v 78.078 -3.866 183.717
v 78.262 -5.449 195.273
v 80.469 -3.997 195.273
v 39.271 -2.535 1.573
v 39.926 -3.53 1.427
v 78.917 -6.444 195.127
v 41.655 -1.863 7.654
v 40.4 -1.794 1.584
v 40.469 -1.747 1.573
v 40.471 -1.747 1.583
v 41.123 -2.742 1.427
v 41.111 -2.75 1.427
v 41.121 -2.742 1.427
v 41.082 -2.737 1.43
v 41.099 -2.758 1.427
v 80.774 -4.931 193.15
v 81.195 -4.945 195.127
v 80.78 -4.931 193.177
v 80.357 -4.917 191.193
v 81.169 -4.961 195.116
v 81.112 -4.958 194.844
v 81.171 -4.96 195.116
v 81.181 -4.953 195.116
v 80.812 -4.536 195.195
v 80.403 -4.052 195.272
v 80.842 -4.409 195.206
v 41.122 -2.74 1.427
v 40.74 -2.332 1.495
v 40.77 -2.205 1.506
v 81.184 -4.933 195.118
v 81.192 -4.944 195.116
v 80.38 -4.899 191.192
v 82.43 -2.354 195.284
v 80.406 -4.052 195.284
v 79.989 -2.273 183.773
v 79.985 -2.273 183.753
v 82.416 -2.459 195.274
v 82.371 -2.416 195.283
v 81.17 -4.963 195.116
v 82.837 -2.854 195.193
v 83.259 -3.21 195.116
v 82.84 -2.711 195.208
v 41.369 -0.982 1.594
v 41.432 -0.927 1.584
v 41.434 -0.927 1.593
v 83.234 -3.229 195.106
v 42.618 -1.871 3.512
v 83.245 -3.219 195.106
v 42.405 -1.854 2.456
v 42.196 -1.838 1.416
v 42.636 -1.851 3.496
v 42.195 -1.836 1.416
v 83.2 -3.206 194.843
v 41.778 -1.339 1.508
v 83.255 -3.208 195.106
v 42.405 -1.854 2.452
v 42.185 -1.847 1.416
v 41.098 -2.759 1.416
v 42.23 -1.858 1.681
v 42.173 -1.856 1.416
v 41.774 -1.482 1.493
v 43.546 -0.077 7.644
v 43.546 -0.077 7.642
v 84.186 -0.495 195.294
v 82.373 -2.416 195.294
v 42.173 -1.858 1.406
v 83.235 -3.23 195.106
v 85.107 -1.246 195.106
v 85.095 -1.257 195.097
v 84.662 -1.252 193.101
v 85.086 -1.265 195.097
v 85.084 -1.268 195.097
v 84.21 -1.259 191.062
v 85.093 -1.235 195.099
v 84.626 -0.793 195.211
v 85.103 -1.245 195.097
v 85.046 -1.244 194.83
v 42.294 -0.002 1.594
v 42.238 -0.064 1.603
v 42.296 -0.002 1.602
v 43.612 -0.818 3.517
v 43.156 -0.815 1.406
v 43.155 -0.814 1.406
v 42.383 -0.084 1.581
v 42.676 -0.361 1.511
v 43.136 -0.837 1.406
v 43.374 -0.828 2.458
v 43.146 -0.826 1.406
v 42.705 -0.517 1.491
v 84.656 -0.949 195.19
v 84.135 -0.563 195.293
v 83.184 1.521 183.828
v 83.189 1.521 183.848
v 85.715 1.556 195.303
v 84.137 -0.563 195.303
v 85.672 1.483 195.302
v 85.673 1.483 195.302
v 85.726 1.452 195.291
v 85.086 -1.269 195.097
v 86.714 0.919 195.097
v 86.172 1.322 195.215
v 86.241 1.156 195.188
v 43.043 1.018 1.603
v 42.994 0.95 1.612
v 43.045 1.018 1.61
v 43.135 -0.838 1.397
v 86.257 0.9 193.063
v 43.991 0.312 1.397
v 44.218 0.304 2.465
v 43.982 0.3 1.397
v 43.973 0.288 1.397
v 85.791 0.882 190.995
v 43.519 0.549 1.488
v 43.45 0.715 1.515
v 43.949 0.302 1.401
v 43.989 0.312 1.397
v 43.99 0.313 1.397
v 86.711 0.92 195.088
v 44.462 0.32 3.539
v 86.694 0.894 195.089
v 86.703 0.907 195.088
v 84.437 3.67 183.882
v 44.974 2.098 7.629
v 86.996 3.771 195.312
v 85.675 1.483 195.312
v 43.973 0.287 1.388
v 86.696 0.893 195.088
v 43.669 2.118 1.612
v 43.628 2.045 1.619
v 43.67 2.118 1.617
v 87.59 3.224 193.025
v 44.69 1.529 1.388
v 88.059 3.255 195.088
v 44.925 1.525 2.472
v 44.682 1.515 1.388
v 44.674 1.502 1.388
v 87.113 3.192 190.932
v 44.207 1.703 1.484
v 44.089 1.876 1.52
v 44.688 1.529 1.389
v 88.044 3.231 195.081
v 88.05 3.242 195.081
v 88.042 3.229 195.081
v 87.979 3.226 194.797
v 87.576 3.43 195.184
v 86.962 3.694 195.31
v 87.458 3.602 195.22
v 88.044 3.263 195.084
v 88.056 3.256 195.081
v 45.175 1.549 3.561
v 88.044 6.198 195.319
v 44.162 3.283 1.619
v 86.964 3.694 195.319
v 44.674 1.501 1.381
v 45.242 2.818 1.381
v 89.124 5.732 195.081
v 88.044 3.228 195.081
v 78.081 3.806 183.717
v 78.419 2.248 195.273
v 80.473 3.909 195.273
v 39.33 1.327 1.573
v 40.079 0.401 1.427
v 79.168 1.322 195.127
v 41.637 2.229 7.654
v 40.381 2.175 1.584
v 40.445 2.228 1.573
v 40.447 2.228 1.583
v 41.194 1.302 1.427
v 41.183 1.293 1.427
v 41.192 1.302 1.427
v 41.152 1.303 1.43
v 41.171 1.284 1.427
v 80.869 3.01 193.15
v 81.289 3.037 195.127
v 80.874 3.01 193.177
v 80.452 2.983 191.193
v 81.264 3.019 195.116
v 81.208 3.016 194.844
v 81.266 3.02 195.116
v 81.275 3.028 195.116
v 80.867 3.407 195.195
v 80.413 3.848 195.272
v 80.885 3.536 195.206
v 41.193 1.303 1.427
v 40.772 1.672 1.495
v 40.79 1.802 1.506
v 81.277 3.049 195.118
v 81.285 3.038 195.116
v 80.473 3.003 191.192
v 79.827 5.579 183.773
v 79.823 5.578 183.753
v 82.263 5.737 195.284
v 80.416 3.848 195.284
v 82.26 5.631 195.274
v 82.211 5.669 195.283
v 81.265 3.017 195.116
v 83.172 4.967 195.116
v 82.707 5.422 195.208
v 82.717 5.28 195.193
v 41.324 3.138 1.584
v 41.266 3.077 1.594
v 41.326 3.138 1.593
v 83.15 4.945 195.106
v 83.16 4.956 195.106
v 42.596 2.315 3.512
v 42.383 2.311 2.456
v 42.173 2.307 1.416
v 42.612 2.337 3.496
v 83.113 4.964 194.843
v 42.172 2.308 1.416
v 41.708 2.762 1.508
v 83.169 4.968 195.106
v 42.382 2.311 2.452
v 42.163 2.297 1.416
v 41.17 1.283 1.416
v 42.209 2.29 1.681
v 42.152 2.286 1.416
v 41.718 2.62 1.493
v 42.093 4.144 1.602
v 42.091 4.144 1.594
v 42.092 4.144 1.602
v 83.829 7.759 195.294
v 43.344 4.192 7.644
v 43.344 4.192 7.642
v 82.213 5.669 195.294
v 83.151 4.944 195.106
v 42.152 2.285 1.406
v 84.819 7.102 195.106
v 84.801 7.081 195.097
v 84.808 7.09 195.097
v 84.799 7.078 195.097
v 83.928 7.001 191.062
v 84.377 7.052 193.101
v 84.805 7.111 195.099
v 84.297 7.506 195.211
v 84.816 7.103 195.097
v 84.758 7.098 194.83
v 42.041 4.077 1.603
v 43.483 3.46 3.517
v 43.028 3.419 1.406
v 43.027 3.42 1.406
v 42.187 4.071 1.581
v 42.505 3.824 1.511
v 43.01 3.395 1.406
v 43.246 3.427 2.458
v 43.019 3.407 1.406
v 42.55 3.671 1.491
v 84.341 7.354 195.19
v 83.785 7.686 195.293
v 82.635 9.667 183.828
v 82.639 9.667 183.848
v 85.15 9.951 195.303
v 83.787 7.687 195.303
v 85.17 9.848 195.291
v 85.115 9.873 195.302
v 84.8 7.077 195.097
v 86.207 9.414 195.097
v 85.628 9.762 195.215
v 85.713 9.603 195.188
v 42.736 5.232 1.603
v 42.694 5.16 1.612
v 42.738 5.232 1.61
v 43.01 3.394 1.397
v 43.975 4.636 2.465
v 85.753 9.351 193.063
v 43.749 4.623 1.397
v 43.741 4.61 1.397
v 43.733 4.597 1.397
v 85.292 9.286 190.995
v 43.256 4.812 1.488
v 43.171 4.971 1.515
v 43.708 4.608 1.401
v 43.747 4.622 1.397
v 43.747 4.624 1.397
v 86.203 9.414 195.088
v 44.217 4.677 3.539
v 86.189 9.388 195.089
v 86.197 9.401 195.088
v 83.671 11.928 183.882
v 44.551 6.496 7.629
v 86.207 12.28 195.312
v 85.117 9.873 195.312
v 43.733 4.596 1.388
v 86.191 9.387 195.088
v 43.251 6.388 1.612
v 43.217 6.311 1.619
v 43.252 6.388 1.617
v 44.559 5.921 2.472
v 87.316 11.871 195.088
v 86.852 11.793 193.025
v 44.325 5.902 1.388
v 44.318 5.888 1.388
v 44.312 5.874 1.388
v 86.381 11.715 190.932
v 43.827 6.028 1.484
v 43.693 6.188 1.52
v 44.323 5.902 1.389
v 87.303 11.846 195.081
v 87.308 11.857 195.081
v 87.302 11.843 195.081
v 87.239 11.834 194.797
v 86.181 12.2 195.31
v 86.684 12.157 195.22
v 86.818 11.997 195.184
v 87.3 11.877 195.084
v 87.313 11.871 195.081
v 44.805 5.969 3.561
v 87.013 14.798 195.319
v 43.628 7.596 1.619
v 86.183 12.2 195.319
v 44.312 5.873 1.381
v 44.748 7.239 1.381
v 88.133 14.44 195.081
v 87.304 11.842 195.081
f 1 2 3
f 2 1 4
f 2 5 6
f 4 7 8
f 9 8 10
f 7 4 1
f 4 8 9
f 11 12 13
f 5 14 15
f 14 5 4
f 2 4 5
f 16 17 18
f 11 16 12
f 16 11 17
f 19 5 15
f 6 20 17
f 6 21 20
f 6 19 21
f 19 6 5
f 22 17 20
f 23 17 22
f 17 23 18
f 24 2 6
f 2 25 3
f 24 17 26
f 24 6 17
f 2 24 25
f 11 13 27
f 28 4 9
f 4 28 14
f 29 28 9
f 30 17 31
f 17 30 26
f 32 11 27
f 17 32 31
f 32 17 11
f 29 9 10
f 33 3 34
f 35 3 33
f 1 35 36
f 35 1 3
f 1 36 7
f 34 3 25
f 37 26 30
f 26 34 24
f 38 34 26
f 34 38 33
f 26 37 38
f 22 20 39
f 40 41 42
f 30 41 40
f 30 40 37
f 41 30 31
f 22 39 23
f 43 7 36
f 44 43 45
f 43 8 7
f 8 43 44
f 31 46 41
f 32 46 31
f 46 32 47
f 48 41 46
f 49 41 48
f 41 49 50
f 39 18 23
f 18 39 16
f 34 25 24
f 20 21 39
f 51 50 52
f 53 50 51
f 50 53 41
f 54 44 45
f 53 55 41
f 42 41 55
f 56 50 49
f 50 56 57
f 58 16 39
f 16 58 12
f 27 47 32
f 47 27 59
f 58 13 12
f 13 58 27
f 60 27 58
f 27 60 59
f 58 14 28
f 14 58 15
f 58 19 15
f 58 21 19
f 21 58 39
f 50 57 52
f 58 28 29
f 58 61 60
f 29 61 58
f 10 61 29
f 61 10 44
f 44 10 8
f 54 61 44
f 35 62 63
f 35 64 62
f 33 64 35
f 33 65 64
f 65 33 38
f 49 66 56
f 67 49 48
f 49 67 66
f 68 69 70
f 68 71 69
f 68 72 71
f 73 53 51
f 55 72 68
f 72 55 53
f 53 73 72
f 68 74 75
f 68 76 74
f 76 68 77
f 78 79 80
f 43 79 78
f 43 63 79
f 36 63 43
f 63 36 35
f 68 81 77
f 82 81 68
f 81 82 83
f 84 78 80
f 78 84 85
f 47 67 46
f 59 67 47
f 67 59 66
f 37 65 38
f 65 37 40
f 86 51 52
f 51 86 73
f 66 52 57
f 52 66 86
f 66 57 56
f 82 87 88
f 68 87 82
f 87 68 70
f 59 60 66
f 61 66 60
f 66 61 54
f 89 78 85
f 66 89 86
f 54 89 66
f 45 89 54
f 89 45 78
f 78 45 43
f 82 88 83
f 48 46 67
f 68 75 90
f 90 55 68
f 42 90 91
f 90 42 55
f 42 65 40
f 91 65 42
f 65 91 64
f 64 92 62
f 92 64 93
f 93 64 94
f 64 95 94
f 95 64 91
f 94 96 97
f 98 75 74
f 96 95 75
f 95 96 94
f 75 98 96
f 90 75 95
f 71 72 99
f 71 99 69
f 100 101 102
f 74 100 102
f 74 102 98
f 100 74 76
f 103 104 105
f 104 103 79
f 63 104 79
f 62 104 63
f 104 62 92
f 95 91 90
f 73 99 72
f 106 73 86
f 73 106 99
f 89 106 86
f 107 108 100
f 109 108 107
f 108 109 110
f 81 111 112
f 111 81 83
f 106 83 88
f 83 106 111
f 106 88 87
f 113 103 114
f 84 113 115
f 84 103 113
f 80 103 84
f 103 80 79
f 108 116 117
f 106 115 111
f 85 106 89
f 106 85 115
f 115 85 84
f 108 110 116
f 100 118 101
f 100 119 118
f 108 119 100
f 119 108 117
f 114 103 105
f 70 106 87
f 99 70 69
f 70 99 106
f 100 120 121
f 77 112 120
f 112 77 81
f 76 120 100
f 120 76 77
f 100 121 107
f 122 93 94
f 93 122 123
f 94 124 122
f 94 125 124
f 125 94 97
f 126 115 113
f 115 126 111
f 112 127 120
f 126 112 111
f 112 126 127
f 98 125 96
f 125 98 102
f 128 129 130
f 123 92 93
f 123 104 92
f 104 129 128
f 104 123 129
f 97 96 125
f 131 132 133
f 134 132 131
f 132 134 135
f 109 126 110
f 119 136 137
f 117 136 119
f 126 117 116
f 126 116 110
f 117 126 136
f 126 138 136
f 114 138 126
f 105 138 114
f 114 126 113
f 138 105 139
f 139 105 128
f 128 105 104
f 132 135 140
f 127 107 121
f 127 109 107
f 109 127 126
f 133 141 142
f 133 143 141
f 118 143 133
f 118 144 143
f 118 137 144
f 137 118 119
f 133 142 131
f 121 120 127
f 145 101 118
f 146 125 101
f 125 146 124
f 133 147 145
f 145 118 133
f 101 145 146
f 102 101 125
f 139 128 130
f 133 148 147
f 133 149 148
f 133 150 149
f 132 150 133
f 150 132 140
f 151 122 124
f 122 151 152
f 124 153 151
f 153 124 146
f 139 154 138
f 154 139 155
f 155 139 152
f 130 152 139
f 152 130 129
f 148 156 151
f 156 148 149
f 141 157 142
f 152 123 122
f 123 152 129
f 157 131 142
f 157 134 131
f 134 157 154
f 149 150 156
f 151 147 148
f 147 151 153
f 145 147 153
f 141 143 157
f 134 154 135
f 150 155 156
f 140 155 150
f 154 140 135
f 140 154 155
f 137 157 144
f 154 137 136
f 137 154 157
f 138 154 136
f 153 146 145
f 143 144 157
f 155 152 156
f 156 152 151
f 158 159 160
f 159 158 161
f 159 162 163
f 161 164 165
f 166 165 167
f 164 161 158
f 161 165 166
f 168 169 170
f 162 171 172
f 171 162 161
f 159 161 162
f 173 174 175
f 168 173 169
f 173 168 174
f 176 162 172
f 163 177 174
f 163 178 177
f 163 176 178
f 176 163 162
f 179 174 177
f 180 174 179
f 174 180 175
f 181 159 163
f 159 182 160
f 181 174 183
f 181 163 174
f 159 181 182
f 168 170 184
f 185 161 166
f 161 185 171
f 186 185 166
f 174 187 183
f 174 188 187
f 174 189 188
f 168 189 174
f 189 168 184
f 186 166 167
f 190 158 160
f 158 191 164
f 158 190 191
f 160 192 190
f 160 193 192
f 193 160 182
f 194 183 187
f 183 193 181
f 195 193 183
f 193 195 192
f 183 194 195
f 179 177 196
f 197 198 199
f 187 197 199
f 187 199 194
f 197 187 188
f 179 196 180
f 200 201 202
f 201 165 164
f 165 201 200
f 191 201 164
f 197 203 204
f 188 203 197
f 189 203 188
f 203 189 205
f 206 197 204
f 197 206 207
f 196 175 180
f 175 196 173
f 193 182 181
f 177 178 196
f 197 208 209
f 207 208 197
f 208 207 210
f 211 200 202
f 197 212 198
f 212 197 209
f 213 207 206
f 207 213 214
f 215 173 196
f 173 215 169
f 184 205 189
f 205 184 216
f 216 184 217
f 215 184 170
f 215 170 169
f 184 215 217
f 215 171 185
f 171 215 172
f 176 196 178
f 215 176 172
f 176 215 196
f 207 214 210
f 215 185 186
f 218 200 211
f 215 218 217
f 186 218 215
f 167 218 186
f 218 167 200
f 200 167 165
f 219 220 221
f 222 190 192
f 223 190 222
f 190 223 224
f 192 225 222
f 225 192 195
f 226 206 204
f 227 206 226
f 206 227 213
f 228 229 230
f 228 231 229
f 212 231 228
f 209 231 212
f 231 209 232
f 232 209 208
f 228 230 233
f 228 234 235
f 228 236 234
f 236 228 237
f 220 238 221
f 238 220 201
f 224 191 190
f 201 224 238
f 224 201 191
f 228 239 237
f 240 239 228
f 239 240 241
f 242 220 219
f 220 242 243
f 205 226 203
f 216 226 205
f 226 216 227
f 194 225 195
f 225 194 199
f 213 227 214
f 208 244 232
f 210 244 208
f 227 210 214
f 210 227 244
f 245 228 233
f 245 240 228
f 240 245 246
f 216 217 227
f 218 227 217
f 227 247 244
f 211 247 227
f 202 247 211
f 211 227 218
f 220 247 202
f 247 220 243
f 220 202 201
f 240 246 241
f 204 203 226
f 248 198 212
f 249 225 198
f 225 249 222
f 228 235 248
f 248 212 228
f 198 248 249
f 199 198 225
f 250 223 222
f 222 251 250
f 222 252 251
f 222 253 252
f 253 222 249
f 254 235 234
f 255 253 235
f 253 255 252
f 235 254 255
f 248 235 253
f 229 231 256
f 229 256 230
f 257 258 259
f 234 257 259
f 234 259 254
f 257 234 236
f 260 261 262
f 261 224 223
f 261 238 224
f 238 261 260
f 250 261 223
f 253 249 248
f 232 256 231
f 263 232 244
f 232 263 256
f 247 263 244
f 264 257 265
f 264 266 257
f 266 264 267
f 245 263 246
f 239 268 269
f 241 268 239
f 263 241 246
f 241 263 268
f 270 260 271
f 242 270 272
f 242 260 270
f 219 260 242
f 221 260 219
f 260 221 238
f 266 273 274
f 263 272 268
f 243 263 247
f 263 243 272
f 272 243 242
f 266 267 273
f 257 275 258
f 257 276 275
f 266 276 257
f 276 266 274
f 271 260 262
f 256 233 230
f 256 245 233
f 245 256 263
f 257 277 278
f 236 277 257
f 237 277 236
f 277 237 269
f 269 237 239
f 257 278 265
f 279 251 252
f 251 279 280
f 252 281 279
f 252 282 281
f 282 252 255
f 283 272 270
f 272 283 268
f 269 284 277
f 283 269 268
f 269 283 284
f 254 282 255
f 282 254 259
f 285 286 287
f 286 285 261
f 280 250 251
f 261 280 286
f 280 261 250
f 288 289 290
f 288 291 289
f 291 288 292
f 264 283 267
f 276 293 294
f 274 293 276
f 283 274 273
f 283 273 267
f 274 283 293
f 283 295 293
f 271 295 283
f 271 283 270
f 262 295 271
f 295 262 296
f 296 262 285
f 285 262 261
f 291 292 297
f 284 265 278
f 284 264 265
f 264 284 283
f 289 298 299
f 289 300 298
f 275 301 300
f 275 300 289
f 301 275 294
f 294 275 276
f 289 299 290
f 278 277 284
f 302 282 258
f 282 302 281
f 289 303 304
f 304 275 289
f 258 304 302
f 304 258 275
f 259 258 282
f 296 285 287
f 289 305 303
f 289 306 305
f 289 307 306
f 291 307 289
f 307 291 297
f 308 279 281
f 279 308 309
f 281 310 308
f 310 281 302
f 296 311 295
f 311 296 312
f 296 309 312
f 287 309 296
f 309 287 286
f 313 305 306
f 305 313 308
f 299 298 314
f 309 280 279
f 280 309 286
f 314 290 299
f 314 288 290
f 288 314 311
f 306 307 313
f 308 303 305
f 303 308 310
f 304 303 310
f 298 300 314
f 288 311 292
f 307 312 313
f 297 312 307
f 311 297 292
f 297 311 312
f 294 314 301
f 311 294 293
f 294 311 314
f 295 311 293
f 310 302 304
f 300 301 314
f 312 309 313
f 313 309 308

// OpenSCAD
// Coffee drip bag bin — first parametric prototype. All dimensions in mm.
// Intended for used drip bags / filters, not loose coffee grounds.
// Print basket upright. Lid is one piece and needs supports.
// Integral vertical floor fins raise the contents. Export parts separately.
// assembled | exploded | basket | tray | lid
part = "assembled";
total_height = 237.6;
top_diameter = 180;
bottom_diameter = top_diameter / 2;
nozzle = 0.4;
line_width = 0.4; // Set to actual slicer extrusion width before final printing.
blade_thickness = 3 * line_width;
blade_count = 64;
blade_angle = 40; // From the local tangent.
overlap_factor = 1.35;
blade_curve_angle = 40; // Shallow circular channel across each blade.
blade_curve_segments = 6;
floor_thickness = 3;
bottom_cone_height = 10; // Interior rises towards the center; exterior stays flat.
tray_floor = 2.4;
tray_wall = 2.4;
tray_height = 38;
tray_radial_clearance = 3;
drain_space = 6;
lid_plate = 3;
lid_skirt = 5; // Internal locating skirt.
lid_clearance = 0.55;
lid_wall = 2.4;
rim_height = 6;
handle_height = 28;
handle_diameter = 48;
floor_fin_height = 6; // Height above the local conical floor.
floor_fin_pitch = 8;
floor_fin_thickness = blade_thickness;
floor_fin_radius = bottom_diameter/2-5; // Open perimeter for drainage.
stiffener_height = 1.8;
stiffener_width = 1.8;
$fn = 64;

basket_z = tray_floor + drain_space;
body_height = total_height - basket_z - lid_plate - handle_height;
rb = bottom_diameter / 2;
rt = top_diameter / 2;
slope = (rt-rb)/body_height;
function rad(z) = rb + slope*z;
function blade_width(r) = 2*PI*r/blade_count*overlap_factor/cos(blade_angle);
function curve_radius(r) = blade_width(r)/(2*sin(blade_curve_angle/2));
function arc_step() = blade_curve_angle/blade_curve_segments;
function segment_x(r,a) = curve_radius(r)*(cos(a)*cos(arc_step()/2)-cos(blade_curve_angle/2));
function segment_y(r,a) = curve_radius(r)*sin(a)*cos(arc_step()/2);
function segment_length(r) = 2*curve_radius(r)*sin(arc_step()/2)+0.10;
function tip_angle() = blade_curve_angle/2-arc_step()/2;
function local_tip_x(r) = segment_x(r,tip_angle())+blade_thickness/2*cos(tip_angle())-segment_length(r)/2*sin(tip_angle());
function local_tip_y(r) = segment_y(r,tip_angle())+blade_thickness/2*sin(tip_angle())+segment_length(r)/2*cos(tip_angle());
function tip_x(r) = local_tip_x(r)*cos(blade_angle)+local_tip_y(r)*sin(blade_angle);
function tip_y(r) = -local_tip_x(r)*sin(blade_angle)+local_tip_y(r)*cos(blade_angle);
function center_r(r) = sqrt(r*r-tip_y(r)*tip_y(r))-tip_x(r);
function tray_inner(z) = rad(z-basket_z)+tray_radial_clearance;
// Covers the whole curved blade section, with at least 1 mm inside cover.
rim_inner_radius = rt - (blade_width(rt)*sin(blade_angle)+blade_thickness+2);

assert(body_height > 80, "Increase total_height");
assert(rt > rb, "Top must be wider than base");
assert(blade_count >= 24 && blade_count <= 64, "Blade count must be between 24 and 64");
assert(blade_thickness > 0, "Invalid blade thickness");

// Each curved-channel facet is a single extruded trapezoid.
// End faces sit inside the bottom and upper rim for flat print surfaces.
function section_center_x(r,a) = center_r(r)+segment_x(r,a)*cos(blade_angle)+segment_y(r,a)*sin(blade_angle);
function section_center_y(r,a) = -segment_x(r,a)*sin(blade_angle)+segment_y(r,a)*cos(blade_angle);
module blade_facet(a) {
    z0 = floor_thickness/2;
    z1 = body_height-rim_height/2;
    r0 = rad(z0);
    r1 = rad(z1);
    beta = a-blade_angle;
    dx = section_center_x(r1,a)-section_center_x(r0,a);
    dy = section_center_y(r1,a)-section_center_y(r0,a);
    dn = dx*cos(beta)+dy*sin(beta);
    dt = -dx*sin(beta)+dy*cos(beta);
    h = z1-z0;
    length = sqrt(h*h+dn*dn);
    tilt = atan(dn/h);
    translate([section_center_x(r0,a),section_center_y(r0,a),z0])
        rotate([0,0,beta])
            rotate([0,tilt,0])
                rotate([90,0,90])
                    linear_extrude(height=blade_thickness,center=true)
                        polygon(points=[
                            [-segment_length(r0)/2,0],
                            [segment_length(r0)/2,0],
                            [dt+segment_length(r1)/2,length],
                            [dt-segment_length(r1)/2,length]
                        ]);
}
module blade() {
    union() {
        for(j=[0:blade_curve_segments-1])
            blade_facet(-blade_curve_angle/2+(j+0.5)*arc_step());
    }
}

union() { blade(); rotate([0,0,360/blade_count]) blade(); }
